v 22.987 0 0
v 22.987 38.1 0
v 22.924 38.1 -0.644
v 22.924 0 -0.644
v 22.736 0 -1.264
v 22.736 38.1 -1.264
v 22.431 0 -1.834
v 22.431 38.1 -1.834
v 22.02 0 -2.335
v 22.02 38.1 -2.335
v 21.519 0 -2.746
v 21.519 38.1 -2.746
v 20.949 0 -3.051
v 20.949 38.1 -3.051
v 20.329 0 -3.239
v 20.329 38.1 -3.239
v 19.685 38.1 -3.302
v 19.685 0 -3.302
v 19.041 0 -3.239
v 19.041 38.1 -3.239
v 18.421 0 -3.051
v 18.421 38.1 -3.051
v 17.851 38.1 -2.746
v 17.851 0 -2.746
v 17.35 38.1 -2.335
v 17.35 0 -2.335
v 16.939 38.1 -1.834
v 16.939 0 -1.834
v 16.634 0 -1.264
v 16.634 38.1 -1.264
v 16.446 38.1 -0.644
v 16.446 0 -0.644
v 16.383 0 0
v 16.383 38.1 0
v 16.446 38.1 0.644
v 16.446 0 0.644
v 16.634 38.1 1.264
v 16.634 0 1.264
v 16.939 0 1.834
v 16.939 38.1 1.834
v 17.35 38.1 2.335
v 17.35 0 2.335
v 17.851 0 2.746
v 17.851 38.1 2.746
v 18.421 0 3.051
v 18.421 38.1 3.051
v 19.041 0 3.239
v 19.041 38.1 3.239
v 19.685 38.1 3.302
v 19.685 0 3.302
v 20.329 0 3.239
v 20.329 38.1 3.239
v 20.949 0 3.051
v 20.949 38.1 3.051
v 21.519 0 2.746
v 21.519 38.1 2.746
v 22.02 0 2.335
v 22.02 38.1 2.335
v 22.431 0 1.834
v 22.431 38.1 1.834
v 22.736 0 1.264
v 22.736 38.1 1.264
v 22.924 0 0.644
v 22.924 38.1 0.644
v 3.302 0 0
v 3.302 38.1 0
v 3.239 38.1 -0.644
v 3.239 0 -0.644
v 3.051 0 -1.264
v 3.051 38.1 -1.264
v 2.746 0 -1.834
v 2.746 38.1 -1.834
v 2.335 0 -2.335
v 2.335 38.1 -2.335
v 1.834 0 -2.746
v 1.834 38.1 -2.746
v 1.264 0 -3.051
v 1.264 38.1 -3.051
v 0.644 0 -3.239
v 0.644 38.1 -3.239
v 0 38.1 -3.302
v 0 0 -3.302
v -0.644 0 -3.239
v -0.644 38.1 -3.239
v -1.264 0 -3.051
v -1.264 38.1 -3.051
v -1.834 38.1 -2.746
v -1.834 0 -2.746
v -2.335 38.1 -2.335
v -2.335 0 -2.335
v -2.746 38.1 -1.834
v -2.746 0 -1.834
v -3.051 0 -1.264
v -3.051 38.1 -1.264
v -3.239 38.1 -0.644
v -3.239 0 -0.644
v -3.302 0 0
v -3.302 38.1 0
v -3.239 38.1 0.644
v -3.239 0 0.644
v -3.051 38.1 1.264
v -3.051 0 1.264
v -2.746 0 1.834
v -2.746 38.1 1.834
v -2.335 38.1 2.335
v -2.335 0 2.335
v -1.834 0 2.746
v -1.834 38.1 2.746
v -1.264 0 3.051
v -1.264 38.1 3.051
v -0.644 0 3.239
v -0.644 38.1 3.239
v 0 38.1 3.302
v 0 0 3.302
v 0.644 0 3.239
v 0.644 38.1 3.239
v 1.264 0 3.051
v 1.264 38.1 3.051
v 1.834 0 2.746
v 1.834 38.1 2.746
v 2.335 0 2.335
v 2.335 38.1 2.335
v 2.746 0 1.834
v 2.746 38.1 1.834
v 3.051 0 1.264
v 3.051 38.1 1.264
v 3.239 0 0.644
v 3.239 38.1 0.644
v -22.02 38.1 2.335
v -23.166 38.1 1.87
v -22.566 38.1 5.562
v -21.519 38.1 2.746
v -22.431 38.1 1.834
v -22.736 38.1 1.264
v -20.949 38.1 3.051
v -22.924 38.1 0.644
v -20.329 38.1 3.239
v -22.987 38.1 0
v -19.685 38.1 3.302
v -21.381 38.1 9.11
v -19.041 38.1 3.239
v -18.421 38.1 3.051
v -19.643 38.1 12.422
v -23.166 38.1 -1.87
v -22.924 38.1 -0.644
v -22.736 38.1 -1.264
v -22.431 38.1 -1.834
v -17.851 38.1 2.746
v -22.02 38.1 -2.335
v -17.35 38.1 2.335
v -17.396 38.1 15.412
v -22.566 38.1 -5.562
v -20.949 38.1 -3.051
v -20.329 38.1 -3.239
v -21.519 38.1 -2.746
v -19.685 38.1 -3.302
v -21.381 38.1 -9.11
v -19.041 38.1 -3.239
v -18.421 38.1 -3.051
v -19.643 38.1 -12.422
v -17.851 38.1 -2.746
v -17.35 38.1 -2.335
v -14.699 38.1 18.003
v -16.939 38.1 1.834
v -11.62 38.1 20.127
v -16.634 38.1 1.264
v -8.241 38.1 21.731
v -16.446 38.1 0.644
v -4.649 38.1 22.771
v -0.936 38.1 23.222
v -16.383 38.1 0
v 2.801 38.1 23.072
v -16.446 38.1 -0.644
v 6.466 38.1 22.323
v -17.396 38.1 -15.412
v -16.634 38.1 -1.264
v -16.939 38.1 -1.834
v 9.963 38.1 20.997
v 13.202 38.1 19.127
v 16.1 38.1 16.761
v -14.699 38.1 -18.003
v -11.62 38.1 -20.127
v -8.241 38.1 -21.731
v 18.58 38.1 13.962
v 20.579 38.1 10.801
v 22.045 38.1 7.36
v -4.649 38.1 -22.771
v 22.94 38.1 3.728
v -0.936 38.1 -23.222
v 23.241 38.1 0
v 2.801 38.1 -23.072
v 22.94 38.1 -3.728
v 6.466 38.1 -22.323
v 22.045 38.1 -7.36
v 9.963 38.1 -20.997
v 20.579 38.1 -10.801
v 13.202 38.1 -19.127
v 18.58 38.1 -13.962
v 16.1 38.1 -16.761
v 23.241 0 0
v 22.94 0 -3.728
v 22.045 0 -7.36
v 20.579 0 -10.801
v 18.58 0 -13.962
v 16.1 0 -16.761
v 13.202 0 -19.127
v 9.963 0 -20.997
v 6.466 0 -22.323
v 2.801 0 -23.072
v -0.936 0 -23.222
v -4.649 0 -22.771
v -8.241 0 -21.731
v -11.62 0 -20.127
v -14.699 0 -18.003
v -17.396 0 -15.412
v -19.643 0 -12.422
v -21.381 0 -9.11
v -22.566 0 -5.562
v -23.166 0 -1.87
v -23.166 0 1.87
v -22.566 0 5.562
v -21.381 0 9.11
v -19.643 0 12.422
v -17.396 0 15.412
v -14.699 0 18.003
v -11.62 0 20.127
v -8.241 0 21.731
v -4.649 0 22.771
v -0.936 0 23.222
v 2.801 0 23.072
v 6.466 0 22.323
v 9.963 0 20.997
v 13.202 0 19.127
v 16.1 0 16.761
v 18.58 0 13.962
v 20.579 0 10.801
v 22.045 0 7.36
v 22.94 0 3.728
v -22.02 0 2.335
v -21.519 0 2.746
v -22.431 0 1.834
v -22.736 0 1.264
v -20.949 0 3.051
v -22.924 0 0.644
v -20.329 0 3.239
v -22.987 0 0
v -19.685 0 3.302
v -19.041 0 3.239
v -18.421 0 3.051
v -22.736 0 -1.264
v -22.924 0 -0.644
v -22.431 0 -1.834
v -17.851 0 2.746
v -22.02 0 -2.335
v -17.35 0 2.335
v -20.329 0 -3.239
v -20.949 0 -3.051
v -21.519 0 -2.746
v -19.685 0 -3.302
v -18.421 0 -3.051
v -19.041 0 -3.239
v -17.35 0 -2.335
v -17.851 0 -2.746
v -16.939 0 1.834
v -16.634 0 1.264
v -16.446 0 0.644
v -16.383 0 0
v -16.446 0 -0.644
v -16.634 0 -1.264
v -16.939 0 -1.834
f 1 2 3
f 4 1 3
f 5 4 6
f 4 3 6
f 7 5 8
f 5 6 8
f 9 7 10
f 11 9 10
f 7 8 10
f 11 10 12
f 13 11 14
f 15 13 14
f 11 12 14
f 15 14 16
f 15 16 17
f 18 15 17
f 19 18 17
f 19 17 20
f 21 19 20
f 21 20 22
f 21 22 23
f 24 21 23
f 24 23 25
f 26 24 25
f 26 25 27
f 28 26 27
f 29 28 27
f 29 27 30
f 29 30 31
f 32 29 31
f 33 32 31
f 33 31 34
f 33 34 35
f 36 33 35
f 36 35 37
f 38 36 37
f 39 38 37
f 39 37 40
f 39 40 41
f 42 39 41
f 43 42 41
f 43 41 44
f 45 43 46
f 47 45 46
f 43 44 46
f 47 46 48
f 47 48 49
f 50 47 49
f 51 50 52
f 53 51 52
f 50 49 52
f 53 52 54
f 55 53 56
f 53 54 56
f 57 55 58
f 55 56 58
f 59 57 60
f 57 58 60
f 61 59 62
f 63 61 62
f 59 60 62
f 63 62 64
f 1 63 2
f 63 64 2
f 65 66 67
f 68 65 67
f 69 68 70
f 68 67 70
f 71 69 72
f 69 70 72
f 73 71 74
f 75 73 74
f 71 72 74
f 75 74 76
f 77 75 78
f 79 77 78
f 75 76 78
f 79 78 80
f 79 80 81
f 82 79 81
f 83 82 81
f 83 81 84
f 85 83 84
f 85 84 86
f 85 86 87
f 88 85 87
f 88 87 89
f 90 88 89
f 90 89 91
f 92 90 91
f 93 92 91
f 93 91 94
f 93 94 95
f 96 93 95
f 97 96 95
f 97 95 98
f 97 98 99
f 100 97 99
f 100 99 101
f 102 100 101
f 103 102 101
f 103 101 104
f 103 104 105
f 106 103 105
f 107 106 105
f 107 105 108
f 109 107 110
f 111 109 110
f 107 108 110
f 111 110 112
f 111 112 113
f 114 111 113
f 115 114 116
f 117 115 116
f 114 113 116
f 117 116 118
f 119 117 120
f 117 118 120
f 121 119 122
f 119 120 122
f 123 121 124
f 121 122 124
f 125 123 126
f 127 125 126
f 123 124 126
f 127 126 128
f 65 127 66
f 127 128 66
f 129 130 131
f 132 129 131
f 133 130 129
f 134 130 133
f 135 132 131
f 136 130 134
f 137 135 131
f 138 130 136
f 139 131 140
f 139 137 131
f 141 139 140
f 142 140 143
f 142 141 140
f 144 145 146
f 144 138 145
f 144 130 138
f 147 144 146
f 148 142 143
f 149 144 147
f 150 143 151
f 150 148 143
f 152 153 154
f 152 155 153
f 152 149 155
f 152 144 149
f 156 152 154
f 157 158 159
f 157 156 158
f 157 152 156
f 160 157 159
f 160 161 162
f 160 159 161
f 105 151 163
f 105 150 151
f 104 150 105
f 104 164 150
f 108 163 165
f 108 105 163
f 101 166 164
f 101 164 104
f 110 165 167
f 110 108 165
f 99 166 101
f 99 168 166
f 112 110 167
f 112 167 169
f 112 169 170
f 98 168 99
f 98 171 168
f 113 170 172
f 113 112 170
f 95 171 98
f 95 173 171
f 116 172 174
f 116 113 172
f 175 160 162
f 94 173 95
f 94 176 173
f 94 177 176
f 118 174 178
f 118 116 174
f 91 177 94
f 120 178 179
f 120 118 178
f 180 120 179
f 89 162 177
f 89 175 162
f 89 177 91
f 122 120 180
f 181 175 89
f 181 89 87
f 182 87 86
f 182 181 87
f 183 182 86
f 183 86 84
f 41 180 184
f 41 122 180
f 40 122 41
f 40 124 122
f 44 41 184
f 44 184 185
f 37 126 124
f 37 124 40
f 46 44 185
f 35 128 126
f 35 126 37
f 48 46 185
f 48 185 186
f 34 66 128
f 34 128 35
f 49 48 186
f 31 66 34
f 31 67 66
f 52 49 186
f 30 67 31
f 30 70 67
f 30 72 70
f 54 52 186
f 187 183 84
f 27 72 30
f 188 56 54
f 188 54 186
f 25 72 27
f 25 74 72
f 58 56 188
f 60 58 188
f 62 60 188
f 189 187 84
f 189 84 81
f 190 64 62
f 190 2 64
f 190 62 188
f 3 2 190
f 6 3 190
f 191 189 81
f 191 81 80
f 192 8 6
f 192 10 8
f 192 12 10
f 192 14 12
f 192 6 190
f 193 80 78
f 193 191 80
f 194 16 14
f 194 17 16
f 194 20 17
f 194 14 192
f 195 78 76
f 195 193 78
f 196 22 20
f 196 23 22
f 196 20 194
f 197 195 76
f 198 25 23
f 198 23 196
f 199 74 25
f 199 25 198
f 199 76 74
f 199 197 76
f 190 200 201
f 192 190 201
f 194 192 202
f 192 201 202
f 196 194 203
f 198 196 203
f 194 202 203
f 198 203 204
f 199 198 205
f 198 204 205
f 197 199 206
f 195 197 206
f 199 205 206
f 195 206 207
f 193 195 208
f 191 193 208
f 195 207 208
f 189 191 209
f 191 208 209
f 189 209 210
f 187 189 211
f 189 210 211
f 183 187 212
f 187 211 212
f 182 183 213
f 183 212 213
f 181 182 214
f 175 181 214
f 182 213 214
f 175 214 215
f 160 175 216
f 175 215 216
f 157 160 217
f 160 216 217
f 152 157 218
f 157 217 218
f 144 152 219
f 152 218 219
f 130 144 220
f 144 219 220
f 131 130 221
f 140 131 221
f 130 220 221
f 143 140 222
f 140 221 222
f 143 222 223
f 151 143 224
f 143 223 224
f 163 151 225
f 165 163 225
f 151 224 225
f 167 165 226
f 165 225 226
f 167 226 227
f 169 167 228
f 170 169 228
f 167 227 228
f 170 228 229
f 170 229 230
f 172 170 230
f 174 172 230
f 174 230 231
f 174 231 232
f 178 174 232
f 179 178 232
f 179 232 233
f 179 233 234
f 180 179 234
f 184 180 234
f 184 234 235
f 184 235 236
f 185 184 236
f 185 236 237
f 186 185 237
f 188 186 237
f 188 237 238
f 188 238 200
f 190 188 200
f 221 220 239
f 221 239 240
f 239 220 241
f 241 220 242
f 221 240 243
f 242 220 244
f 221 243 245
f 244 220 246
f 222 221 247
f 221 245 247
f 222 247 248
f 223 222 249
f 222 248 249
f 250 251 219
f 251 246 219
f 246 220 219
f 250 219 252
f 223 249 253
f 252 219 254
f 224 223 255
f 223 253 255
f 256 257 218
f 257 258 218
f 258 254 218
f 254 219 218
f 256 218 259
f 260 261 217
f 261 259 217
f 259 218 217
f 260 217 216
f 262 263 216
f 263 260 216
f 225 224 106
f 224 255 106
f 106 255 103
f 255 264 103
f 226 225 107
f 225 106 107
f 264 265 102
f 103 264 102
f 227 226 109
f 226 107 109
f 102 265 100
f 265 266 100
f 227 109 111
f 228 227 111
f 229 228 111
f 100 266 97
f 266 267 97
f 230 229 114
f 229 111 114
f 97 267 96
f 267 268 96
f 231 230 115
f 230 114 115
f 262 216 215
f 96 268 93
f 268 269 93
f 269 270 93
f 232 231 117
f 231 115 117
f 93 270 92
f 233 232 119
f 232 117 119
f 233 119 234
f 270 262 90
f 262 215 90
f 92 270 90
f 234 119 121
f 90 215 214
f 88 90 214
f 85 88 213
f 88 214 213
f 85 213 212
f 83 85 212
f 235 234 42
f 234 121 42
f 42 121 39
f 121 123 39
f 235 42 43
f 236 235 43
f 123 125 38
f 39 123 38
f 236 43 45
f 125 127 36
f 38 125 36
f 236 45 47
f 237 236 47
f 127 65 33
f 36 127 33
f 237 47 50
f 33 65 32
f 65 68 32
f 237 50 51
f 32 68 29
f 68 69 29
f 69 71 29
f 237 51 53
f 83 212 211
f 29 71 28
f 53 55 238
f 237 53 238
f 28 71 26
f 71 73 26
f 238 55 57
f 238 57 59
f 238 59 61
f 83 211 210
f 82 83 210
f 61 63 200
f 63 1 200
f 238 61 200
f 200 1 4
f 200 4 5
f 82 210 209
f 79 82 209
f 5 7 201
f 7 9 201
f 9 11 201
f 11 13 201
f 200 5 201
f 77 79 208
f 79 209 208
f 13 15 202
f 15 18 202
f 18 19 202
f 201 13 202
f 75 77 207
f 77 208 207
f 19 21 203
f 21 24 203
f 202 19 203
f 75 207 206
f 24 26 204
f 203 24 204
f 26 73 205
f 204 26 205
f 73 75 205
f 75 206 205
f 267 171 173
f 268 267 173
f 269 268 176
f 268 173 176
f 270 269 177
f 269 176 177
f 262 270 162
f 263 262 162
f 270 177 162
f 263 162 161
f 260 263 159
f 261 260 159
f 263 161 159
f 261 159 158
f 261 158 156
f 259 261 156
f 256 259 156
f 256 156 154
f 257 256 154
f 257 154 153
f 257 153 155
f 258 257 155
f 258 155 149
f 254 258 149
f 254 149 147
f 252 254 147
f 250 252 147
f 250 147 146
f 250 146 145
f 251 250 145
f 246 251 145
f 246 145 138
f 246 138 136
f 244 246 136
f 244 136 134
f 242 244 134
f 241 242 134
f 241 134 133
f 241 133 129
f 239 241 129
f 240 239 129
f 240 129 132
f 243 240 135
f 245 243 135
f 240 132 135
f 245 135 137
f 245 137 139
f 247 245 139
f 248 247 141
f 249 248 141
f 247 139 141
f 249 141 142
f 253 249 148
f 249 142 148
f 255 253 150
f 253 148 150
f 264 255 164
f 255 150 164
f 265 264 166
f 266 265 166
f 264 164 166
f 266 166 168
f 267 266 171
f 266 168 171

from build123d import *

# Parameters (mm, degrees)
SKETCH1_R           = 23.241
BOSS_EXTRUDE1_DEPTH = 38.1
CUT_EXTRUDE1_REACH  = 40.1
SKETCH2_R           = 3.302
CUT_EXTRUDE2_REACH  = 40.1
SKETCH3_R           = 3.302


with BuildPart() as part:
    # Sketch1 → Boss-Extrude1 (new body)
    with BuildSketch(Plane(origin=(0, 0, 0), x_dir=(1, 0, 0), z_dir=(0, 1, 0))):
        Circle(SKETCH1_R)
    extrude(amount=BOSS_EXTRUDE1_DEPTH)

    # Sketch2 → Cut-Extrude1 (cut, up to next)
    with BuildSketch(Plane(origin=(0, 38.1, 0), x_dir=(1, 0, 0), z_dir=(0, 1, 0)), mode=Mode.PRIVATE) as cut_extrude1_sk1:
        with Locations((19.685, 0)):
            Circle(SKETCH2_R)
    cut_extrude1_tool1 = extrude(cut_extrude1_sk1.sketch, amount=-CUT_EXTRUDE1_REACH, mode=Mode.PRIVATE) & part.part
    add(cut_extrude1_tool1.solids().sort_by_distance((19.685, 38.1, 0))[0], mode=Mode.SUBTRACT)
    # Sketch2 → Cut-Extrude1 (cut, up to next)
    with BuildSketch(Plane(origin=(0, 38.1, 0), x_dir=(1, 0, 0), z_dir=(0, 1, 0)), mode=Mode.PRIVATE) as cut_extrude1_sk2:
        with Locations((-19.685, 0)):
            Circle(SKETCH2_R)
    cut_extrude1_tool2 = extrude(cut_extrude1_sk2.sketch, amount=-CUT_EXTRUDE1_REACH, mode=Mode.PRIVATE) & part.part
    add(cut_extrude1_tool2.solids().sort_by_distance((-19.685, 38.1, 0))[0], mode=Mode.SUBTRACT)

    # Sketch3 → Cut-Extrude2 (cut, up to next)
    with BuildSketch(Plane(origin=(0, 38.1, 0), x_dir=(1, 0, 0), z_dir=(0, 1, 0)), mode=Mode.PRIVATE) as cut_extrude2_sk1:
        Circle(SKETCH3_R)
    cut_extrude2_tool1 = extrude(cut_extrude2_sk1.sketch, amount=-CUT_EXTRUDE2_REACH, mode=Mode.PRIVATE) & part.part
    add(cut_extrude2_tool1.solids().sort_by_distance((0, 38.1, 0))[0], mode=Mode.SUBTRACT)


solid = part.part
